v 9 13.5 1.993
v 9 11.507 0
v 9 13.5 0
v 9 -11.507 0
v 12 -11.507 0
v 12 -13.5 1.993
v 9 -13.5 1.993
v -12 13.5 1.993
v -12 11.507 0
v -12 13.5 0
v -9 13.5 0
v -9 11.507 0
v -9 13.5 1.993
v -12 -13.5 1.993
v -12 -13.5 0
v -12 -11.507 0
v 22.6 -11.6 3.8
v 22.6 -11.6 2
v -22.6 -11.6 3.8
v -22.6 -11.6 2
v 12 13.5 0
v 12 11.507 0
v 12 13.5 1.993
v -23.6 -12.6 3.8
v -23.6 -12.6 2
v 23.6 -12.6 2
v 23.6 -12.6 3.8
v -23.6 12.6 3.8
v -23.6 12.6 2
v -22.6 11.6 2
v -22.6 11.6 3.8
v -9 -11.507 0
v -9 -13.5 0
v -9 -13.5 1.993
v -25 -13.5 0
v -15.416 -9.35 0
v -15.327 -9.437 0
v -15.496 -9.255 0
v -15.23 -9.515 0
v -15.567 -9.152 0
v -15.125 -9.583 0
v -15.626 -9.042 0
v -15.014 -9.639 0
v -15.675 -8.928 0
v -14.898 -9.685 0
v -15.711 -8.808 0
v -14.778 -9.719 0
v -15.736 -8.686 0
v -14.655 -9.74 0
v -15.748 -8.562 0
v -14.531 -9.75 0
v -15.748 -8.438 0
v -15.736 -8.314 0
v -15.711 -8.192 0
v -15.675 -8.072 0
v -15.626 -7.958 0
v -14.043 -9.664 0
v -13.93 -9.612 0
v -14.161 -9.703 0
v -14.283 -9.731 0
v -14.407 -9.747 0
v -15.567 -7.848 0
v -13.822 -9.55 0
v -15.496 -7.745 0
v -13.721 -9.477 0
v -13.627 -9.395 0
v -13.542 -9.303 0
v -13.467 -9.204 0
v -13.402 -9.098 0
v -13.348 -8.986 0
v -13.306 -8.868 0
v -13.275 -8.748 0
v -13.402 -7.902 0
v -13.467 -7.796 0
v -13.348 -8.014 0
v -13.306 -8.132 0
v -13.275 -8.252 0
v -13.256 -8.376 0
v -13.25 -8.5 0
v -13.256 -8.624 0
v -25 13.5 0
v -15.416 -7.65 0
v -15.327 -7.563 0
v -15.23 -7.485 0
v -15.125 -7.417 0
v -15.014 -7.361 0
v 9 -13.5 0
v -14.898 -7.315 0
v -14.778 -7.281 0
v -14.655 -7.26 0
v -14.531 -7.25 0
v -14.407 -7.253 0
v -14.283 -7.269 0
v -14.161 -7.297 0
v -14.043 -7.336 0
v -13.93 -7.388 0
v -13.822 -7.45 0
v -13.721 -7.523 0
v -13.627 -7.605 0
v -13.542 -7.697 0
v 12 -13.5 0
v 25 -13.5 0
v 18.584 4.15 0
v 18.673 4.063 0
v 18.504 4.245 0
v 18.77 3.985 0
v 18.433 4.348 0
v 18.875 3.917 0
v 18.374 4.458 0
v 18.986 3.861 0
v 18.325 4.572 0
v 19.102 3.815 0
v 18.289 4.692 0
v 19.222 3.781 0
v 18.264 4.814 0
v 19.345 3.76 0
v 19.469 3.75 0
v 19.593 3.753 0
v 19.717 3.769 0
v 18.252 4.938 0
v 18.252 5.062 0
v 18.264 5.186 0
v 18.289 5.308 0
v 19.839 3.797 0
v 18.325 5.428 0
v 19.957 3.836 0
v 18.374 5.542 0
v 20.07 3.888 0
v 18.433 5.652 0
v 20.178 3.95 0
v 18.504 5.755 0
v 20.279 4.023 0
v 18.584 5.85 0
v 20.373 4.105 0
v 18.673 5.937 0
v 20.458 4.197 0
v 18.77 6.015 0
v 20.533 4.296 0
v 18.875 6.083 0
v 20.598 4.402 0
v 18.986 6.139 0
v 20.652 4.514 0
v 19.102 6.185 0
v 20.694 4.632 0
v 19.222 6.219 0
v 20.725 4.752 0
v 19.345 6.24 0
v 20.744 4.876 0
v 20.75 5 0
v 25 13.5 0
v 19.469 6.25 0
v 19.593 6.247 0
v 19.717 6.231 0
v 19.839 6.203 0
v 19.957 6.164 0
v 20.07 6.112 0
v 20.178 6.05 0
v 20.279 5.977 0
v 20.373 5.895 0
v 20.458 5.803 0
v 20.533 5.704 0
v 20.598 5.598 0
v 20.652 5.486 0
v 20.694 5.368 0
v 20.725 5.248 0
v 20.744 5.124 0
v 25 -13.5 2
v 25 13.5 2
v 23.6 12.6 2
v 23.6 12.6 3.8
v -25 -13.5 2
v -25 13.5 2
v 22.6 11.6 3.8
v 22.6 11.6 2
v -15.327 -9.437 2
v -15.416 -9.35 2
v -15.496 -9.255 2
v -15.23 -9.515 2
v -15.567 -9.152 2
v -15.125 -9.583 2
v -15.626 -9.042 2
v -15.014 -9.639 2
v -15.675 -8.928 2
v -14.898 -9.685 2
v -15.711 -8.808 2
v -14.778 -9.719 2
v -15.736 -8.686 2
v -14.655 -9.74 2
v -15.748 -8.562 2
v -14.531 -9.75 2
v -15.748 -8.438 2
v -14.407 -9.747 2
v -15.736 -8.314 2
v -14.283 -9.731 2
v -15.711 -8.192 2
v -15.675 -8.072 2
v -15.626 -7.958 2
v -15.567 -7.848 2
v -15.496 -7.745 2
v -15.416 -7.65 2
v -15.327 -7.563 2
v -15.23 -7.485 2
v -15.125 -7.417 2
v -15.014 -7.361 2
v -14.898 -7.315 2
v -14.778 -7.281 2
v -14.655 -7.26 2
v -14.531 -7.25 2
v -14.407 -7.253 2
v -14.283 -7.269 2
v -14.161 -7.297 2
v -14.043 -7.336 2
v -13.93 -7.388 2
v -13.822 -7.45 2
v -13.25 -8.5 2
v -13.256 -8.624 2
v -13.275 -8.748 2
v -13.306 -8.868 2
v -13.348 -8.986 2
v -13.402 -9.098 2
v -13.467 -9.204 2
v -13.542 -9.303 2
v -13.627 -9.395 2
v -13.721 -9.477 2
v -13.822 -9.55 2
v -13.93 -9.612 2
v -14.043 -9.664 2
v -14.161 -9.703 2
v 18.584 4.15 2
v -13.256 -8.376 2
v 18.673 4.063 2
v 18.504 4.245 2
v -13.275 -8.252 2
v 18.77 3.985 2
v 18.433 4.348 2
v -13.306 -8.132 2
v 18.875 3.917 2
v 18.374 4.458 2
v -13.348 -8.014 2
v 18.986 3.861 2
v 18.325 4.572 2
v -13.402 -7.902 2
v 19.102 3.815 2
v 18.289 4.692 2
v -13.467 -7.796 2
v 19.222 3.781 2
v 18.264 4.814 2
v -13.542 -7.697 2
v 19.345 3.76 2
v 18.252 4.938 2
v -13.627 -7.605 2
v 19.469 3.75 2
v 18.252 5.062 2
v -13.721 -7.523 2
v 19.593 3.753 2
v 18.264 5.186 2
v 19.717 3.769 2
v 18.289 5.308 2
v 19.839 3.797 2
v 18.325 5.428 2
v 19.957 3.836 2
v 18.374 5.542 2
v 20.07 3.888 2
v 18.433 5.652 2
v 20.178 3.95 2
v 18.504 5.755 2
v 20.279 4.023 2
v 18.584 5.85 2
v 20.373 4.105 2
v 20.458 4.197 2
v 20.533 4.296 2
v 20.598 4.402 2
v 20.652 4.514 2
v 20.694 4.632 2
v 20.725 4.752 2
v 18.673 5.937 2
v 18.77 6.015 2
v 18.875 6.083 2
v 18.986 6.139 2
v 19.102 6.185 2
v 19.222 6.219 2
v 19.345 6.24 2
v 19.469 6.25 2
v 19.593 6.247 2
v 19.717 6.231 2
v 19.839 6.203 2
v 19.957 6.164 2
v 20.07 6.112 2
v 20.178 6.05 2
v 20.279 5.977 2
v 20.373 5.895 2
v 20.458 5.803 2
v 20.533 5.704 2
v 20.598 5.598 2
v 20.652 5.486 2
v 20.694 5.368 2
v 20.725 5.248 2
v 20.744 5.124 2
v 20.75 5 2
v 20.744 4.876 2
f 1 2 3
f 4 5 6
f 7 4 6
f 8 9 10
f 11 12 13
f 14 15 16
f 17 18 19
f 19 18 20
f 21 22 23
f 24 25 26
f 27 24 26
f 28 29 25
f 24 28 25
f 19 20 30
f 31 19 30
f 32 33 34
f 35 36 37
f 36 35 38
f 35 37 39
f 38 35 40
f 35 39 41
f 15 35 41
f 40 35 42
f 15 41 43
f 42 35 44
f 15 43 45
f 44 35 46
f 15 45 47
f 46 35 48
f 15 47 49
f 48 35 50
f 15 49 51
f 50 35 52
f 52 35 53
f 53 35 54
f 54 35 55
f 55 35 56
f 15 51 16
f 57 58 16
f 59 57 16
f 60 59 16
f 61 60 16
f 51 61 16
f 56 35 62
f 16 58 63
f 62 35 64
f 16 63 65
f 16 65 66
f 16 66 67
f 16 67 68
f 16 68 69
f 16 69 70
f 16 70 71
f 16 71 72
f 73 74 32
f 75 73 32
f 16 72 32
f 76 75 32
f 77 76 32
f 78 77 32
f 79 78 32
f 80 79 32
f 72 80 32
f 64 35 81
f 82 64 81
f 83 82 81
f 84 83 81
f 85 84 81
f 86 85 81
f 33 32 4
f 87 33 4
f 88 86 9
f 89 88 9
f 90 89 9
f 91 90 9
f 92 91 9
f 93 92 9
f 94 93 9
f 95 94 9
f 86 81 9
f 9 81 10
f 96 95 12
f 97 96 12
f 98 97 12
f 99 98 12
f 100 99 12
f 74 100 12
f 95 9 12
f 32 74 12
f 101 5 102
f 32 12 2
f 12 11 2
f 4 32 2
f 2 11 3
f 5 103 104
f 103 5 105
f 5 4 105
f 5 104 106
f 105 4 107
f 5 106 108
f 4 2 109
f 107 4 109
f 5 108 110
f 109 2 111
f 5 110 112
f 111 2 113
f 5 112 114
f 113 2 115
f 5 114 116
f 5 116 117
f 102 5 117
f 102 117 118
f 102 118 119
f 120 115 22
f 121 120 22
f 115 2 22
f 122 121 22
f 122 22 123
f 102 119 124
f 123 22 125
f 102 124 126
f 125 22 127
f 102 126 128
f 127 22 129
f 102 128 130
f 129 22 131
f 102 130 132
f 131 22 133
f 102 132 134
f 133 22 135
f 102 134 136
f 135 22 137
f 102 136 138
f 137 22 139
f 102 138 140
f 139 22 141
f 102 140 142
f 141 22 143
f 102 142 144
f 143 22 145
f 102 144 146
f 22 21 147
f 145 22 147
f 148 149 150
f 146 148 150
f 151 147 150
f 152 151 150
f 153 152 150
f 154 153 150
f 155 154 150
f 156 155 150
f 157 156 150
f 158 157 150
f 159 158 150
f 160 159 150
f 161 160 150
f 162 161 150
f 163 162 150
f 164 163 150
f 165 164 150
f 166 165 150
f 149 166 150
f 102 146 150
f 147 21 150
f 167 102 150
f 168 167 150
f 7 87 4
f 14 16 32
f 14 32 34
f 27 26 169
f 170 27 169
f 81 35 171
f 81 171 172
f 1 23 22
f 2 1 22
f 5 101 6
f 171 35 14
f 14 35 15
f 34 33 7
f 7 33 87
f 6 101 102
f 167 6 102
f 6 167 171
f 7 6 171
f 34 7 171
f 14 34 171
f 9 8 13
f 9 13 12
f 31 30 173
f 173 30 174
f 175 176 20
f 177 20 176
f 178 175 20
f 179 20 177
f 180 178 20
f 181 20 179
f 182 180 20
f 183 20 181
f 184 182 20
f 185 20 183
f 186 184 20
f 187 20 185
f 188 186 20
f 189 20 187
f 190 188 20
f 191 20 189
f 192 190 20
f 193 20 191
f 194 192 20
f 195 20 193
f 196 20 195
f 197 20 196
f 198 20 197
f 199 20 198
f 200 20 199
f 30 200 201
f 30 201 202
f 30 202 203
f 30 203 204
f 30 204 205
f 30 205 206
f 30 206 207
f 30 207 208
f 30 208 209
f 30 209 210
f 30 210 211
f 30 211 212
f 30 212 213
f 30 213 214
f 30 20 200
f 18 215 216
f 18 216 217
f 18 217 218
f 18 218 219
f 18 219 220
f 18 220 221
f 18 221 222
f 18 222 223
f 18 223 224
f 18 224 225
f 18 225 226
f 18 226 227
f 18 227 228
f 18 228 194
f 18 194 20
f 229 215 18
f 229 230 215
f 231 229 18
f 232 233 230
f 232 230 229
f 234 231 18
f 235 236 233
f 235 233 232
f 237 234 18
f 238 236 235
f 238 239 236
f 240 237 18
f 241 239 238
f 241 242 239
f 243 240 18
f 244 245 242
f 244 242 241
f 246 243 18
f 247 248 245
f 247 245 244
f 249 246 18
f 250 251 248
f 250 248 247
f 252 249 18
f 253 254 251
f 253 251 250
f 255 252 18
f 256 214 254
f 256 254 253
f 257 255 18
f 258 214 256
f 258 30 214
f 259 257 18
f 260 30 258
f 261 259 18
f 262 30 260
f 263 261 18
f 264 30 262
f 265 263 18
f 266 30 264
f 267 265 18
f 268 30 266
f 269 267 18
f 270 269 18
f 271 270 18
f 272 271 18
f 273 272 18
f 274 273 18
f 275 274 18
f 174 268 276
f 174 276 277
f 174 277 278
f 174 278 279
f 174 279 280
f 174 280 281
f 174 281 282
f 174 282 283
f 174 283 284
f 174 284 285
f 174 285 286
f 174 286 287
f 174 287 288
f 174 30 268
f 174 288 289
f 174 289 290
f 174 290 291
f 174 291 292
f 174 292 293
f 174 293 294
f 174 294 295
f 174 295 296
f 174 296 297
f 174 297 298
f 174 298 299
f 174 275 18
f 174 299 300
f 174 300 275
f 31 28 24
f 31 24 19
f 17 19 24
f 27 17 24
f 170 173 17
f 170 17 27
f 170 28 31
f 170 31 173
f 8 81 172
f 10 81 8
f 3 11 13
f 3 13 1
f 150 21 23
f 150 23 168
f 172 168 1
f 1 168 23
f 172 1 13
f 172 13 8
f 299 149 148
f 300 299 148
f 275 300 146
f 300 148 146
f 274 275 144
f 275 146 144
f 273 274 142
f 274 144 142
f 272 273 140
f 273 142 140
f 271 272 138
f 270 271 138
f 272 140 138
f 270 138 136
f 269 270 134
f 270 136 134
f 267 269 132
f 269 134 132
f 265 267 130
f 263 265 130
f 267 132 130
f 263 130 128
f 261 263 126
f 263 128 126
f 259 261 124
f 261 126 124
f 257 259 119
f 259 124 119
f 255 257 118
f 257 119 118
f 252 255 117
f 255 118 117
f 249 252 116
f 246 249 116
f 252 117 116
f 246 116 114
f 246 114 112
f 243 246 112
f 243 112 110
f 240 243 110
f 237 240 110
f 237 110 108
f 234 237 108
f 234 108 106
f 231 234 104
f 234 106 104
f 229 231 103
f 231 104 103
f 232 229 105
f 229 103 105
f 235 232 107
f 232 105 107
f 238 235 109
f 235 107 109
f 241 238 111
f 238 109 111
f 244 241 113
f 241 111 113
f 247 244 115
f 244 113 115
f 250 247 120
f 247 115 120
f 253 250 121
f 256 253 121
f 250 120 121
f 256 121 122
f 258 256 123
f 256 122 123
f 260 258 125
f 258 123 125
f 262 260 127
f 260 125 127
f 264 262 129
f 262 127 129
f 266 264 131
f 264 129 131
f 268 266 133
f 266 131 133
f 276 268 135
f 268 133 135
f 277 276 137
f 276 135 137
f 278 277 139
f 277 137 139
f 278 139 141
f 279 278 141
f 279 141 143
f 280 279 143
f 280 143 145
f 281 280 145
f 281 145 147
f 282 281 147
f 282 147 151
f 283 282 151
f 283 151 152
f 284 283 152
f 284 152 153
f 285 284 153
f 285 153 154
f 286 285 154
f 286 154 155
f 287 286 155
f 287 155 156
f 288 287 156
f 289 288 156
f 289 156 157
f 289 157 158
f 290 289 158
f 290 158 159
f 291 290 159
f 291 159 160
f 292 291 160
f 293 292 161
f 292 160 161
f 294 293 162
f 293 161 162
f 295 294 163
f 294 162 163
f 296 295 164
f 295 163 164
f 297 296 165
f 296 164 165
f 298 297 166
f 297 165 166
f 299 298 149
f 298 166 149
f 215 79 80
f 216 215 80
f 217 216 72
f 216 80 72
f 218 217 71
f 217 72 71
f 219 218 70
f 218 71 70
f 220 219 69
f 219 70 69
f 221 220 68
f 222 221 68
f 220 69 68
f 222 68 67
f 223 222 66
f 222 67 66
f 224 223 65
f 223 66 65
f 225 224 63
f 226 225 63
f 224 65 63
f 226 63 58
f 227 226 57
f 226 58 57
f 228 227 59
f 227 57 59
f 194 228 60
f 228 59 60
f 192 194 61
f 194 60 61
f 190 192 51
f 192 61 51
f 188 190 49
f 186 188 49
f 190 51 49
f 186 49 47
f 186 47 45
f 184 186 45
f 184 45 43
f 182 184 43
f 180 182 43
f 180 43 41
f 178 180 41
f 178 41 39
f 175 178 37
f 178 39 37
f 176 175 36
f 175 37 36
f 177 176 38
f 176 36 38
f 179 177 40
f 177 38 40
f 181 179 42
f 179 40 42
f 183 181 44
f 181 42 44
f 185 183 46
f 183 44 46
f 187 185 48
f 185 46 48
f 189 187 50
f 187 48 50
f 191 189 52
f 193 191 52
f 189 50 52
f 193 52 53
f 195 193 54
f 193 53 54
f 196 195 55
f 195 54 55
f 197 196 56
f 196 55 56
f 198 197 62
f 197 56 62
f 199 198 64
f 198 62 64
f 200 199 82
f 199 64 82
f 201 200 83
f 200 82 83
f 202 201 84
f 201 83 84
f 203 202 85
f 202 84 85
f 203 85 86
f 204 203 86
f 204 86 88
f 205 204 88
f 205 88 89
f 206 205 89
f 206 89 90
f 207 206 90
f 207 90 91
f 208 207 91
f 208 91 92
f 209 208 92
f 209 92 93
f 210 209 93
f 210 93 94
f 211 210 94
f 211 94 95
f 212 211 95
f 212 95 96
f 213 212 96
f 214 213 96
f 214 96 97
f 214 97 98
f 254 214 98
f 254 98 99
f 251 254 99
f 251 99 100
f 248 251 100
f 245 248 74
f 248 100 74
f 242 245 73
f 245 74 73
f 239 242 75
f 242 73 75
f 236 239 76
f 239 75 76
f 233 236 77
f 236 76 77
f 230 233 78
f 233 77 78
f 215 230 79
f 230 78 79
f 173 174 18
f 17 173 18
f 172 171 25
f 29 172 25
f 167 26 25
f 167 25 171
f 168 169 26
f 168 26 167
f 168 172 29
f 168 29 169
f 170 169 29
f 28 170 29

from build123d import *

# Parameters (mm, degrees)
F0_W      = 50
F0_H      = 27
F1_DEPTH  = 2
F2_W      = 1
F2_H      = 23.2
F2_H_2    = 0.3
F3_DEPTH  = 1.8
F4_R      = 1.25
F5_DEPTH  = 2
F11_DEPTH = 3
F12_DEPTH = 3


with BuildPart() as f1:
    # F0 (on Top) → F1 (new body)
    with BuildSketch(Plane.XY):
        Rectangle(F0_W, F0_H)
    extrude(amount=F1_DEPTH)

    # F2 (on face) → F3 (join)
    with BuildSketch(Plane.XY.offset(2)):
        with Locations((23.1, 0)):
            Rectangle(F2_W, F2_H)
        with Locations((23.1, 11.75)):
            Rectangle(F2_W, F2_H_2)
        Polygon((-22.6, 11.6), (22.6, 11.6), (22.6, 11.9), (23.6, 11.9), (23.6, 12.6), (-23.6, 12.6), (-23.6, 11.9), (-22.6, 11.9), align=None)
        with Locations((23.1, -11.75)):
            Rectangle(F2_W, F2_H_2)
        with Locations((-23.1, 0)):
            Rectangle(F2_W, F2_H)
        with Locations((-23.1, 11.75)):
            Rectangle(F2_W, F2_H_2)
        Polygon((22.6, -11.9), (22.6, -11.6), (-22.6, -11.6), (-22.6, -11.9), (-23.6, -11.9), (-23.6, -12.6), (23.6, -12.6), (23.6, -11.9), align=None)
        with Locations((-23.1, -11.75)):
            Rectangle(F2_W, F2_H_2)
    extrude(amount=F3_DEPTH)

    # F4 (on face) → F5 (cut)
    with BuildSketch(Plane(origin=(0, 0, 0), x_dir=(1, 0, 0), z_dir=(0, 0, -1))):
        with Locations((-14.5, 8.5)):
            Circle(F4_R)
        with Locations((19.5, -5)):
            Circle(F4_R)
    extrude(amount=-F5_DEPTH, mode=Mode.SUBTRACT)

    # F9 (on offset) → F11 (cut)
    with BuildSketch(Plane.YZ.offset(12)):
        Polygon((0, -11.506825), (-13.72761, 2.220785), (-13.72761, -11.823715), (0, -11.823715), (13.72761, -11.823715), (13.72761, 2.220785), align=None)
    extrude(amount=-F11_DEPTH, mode=Mode.SUBTRACT)

    # F10 (on offset) → F12 (cut)
    with BuildSketch(Plane.YZ.offset(-12)):
        Polygon((0, -11.506825), (-13.72761, 2.220785), (-13.72761, -11.823715), (0, -11.823715), (13.72761, -11.823715), (13.72761, 2.220785), align=None)
    extrude(amount=F12_DEPTH, mode=Mode.SUBTRACT)


solid = f1.part
